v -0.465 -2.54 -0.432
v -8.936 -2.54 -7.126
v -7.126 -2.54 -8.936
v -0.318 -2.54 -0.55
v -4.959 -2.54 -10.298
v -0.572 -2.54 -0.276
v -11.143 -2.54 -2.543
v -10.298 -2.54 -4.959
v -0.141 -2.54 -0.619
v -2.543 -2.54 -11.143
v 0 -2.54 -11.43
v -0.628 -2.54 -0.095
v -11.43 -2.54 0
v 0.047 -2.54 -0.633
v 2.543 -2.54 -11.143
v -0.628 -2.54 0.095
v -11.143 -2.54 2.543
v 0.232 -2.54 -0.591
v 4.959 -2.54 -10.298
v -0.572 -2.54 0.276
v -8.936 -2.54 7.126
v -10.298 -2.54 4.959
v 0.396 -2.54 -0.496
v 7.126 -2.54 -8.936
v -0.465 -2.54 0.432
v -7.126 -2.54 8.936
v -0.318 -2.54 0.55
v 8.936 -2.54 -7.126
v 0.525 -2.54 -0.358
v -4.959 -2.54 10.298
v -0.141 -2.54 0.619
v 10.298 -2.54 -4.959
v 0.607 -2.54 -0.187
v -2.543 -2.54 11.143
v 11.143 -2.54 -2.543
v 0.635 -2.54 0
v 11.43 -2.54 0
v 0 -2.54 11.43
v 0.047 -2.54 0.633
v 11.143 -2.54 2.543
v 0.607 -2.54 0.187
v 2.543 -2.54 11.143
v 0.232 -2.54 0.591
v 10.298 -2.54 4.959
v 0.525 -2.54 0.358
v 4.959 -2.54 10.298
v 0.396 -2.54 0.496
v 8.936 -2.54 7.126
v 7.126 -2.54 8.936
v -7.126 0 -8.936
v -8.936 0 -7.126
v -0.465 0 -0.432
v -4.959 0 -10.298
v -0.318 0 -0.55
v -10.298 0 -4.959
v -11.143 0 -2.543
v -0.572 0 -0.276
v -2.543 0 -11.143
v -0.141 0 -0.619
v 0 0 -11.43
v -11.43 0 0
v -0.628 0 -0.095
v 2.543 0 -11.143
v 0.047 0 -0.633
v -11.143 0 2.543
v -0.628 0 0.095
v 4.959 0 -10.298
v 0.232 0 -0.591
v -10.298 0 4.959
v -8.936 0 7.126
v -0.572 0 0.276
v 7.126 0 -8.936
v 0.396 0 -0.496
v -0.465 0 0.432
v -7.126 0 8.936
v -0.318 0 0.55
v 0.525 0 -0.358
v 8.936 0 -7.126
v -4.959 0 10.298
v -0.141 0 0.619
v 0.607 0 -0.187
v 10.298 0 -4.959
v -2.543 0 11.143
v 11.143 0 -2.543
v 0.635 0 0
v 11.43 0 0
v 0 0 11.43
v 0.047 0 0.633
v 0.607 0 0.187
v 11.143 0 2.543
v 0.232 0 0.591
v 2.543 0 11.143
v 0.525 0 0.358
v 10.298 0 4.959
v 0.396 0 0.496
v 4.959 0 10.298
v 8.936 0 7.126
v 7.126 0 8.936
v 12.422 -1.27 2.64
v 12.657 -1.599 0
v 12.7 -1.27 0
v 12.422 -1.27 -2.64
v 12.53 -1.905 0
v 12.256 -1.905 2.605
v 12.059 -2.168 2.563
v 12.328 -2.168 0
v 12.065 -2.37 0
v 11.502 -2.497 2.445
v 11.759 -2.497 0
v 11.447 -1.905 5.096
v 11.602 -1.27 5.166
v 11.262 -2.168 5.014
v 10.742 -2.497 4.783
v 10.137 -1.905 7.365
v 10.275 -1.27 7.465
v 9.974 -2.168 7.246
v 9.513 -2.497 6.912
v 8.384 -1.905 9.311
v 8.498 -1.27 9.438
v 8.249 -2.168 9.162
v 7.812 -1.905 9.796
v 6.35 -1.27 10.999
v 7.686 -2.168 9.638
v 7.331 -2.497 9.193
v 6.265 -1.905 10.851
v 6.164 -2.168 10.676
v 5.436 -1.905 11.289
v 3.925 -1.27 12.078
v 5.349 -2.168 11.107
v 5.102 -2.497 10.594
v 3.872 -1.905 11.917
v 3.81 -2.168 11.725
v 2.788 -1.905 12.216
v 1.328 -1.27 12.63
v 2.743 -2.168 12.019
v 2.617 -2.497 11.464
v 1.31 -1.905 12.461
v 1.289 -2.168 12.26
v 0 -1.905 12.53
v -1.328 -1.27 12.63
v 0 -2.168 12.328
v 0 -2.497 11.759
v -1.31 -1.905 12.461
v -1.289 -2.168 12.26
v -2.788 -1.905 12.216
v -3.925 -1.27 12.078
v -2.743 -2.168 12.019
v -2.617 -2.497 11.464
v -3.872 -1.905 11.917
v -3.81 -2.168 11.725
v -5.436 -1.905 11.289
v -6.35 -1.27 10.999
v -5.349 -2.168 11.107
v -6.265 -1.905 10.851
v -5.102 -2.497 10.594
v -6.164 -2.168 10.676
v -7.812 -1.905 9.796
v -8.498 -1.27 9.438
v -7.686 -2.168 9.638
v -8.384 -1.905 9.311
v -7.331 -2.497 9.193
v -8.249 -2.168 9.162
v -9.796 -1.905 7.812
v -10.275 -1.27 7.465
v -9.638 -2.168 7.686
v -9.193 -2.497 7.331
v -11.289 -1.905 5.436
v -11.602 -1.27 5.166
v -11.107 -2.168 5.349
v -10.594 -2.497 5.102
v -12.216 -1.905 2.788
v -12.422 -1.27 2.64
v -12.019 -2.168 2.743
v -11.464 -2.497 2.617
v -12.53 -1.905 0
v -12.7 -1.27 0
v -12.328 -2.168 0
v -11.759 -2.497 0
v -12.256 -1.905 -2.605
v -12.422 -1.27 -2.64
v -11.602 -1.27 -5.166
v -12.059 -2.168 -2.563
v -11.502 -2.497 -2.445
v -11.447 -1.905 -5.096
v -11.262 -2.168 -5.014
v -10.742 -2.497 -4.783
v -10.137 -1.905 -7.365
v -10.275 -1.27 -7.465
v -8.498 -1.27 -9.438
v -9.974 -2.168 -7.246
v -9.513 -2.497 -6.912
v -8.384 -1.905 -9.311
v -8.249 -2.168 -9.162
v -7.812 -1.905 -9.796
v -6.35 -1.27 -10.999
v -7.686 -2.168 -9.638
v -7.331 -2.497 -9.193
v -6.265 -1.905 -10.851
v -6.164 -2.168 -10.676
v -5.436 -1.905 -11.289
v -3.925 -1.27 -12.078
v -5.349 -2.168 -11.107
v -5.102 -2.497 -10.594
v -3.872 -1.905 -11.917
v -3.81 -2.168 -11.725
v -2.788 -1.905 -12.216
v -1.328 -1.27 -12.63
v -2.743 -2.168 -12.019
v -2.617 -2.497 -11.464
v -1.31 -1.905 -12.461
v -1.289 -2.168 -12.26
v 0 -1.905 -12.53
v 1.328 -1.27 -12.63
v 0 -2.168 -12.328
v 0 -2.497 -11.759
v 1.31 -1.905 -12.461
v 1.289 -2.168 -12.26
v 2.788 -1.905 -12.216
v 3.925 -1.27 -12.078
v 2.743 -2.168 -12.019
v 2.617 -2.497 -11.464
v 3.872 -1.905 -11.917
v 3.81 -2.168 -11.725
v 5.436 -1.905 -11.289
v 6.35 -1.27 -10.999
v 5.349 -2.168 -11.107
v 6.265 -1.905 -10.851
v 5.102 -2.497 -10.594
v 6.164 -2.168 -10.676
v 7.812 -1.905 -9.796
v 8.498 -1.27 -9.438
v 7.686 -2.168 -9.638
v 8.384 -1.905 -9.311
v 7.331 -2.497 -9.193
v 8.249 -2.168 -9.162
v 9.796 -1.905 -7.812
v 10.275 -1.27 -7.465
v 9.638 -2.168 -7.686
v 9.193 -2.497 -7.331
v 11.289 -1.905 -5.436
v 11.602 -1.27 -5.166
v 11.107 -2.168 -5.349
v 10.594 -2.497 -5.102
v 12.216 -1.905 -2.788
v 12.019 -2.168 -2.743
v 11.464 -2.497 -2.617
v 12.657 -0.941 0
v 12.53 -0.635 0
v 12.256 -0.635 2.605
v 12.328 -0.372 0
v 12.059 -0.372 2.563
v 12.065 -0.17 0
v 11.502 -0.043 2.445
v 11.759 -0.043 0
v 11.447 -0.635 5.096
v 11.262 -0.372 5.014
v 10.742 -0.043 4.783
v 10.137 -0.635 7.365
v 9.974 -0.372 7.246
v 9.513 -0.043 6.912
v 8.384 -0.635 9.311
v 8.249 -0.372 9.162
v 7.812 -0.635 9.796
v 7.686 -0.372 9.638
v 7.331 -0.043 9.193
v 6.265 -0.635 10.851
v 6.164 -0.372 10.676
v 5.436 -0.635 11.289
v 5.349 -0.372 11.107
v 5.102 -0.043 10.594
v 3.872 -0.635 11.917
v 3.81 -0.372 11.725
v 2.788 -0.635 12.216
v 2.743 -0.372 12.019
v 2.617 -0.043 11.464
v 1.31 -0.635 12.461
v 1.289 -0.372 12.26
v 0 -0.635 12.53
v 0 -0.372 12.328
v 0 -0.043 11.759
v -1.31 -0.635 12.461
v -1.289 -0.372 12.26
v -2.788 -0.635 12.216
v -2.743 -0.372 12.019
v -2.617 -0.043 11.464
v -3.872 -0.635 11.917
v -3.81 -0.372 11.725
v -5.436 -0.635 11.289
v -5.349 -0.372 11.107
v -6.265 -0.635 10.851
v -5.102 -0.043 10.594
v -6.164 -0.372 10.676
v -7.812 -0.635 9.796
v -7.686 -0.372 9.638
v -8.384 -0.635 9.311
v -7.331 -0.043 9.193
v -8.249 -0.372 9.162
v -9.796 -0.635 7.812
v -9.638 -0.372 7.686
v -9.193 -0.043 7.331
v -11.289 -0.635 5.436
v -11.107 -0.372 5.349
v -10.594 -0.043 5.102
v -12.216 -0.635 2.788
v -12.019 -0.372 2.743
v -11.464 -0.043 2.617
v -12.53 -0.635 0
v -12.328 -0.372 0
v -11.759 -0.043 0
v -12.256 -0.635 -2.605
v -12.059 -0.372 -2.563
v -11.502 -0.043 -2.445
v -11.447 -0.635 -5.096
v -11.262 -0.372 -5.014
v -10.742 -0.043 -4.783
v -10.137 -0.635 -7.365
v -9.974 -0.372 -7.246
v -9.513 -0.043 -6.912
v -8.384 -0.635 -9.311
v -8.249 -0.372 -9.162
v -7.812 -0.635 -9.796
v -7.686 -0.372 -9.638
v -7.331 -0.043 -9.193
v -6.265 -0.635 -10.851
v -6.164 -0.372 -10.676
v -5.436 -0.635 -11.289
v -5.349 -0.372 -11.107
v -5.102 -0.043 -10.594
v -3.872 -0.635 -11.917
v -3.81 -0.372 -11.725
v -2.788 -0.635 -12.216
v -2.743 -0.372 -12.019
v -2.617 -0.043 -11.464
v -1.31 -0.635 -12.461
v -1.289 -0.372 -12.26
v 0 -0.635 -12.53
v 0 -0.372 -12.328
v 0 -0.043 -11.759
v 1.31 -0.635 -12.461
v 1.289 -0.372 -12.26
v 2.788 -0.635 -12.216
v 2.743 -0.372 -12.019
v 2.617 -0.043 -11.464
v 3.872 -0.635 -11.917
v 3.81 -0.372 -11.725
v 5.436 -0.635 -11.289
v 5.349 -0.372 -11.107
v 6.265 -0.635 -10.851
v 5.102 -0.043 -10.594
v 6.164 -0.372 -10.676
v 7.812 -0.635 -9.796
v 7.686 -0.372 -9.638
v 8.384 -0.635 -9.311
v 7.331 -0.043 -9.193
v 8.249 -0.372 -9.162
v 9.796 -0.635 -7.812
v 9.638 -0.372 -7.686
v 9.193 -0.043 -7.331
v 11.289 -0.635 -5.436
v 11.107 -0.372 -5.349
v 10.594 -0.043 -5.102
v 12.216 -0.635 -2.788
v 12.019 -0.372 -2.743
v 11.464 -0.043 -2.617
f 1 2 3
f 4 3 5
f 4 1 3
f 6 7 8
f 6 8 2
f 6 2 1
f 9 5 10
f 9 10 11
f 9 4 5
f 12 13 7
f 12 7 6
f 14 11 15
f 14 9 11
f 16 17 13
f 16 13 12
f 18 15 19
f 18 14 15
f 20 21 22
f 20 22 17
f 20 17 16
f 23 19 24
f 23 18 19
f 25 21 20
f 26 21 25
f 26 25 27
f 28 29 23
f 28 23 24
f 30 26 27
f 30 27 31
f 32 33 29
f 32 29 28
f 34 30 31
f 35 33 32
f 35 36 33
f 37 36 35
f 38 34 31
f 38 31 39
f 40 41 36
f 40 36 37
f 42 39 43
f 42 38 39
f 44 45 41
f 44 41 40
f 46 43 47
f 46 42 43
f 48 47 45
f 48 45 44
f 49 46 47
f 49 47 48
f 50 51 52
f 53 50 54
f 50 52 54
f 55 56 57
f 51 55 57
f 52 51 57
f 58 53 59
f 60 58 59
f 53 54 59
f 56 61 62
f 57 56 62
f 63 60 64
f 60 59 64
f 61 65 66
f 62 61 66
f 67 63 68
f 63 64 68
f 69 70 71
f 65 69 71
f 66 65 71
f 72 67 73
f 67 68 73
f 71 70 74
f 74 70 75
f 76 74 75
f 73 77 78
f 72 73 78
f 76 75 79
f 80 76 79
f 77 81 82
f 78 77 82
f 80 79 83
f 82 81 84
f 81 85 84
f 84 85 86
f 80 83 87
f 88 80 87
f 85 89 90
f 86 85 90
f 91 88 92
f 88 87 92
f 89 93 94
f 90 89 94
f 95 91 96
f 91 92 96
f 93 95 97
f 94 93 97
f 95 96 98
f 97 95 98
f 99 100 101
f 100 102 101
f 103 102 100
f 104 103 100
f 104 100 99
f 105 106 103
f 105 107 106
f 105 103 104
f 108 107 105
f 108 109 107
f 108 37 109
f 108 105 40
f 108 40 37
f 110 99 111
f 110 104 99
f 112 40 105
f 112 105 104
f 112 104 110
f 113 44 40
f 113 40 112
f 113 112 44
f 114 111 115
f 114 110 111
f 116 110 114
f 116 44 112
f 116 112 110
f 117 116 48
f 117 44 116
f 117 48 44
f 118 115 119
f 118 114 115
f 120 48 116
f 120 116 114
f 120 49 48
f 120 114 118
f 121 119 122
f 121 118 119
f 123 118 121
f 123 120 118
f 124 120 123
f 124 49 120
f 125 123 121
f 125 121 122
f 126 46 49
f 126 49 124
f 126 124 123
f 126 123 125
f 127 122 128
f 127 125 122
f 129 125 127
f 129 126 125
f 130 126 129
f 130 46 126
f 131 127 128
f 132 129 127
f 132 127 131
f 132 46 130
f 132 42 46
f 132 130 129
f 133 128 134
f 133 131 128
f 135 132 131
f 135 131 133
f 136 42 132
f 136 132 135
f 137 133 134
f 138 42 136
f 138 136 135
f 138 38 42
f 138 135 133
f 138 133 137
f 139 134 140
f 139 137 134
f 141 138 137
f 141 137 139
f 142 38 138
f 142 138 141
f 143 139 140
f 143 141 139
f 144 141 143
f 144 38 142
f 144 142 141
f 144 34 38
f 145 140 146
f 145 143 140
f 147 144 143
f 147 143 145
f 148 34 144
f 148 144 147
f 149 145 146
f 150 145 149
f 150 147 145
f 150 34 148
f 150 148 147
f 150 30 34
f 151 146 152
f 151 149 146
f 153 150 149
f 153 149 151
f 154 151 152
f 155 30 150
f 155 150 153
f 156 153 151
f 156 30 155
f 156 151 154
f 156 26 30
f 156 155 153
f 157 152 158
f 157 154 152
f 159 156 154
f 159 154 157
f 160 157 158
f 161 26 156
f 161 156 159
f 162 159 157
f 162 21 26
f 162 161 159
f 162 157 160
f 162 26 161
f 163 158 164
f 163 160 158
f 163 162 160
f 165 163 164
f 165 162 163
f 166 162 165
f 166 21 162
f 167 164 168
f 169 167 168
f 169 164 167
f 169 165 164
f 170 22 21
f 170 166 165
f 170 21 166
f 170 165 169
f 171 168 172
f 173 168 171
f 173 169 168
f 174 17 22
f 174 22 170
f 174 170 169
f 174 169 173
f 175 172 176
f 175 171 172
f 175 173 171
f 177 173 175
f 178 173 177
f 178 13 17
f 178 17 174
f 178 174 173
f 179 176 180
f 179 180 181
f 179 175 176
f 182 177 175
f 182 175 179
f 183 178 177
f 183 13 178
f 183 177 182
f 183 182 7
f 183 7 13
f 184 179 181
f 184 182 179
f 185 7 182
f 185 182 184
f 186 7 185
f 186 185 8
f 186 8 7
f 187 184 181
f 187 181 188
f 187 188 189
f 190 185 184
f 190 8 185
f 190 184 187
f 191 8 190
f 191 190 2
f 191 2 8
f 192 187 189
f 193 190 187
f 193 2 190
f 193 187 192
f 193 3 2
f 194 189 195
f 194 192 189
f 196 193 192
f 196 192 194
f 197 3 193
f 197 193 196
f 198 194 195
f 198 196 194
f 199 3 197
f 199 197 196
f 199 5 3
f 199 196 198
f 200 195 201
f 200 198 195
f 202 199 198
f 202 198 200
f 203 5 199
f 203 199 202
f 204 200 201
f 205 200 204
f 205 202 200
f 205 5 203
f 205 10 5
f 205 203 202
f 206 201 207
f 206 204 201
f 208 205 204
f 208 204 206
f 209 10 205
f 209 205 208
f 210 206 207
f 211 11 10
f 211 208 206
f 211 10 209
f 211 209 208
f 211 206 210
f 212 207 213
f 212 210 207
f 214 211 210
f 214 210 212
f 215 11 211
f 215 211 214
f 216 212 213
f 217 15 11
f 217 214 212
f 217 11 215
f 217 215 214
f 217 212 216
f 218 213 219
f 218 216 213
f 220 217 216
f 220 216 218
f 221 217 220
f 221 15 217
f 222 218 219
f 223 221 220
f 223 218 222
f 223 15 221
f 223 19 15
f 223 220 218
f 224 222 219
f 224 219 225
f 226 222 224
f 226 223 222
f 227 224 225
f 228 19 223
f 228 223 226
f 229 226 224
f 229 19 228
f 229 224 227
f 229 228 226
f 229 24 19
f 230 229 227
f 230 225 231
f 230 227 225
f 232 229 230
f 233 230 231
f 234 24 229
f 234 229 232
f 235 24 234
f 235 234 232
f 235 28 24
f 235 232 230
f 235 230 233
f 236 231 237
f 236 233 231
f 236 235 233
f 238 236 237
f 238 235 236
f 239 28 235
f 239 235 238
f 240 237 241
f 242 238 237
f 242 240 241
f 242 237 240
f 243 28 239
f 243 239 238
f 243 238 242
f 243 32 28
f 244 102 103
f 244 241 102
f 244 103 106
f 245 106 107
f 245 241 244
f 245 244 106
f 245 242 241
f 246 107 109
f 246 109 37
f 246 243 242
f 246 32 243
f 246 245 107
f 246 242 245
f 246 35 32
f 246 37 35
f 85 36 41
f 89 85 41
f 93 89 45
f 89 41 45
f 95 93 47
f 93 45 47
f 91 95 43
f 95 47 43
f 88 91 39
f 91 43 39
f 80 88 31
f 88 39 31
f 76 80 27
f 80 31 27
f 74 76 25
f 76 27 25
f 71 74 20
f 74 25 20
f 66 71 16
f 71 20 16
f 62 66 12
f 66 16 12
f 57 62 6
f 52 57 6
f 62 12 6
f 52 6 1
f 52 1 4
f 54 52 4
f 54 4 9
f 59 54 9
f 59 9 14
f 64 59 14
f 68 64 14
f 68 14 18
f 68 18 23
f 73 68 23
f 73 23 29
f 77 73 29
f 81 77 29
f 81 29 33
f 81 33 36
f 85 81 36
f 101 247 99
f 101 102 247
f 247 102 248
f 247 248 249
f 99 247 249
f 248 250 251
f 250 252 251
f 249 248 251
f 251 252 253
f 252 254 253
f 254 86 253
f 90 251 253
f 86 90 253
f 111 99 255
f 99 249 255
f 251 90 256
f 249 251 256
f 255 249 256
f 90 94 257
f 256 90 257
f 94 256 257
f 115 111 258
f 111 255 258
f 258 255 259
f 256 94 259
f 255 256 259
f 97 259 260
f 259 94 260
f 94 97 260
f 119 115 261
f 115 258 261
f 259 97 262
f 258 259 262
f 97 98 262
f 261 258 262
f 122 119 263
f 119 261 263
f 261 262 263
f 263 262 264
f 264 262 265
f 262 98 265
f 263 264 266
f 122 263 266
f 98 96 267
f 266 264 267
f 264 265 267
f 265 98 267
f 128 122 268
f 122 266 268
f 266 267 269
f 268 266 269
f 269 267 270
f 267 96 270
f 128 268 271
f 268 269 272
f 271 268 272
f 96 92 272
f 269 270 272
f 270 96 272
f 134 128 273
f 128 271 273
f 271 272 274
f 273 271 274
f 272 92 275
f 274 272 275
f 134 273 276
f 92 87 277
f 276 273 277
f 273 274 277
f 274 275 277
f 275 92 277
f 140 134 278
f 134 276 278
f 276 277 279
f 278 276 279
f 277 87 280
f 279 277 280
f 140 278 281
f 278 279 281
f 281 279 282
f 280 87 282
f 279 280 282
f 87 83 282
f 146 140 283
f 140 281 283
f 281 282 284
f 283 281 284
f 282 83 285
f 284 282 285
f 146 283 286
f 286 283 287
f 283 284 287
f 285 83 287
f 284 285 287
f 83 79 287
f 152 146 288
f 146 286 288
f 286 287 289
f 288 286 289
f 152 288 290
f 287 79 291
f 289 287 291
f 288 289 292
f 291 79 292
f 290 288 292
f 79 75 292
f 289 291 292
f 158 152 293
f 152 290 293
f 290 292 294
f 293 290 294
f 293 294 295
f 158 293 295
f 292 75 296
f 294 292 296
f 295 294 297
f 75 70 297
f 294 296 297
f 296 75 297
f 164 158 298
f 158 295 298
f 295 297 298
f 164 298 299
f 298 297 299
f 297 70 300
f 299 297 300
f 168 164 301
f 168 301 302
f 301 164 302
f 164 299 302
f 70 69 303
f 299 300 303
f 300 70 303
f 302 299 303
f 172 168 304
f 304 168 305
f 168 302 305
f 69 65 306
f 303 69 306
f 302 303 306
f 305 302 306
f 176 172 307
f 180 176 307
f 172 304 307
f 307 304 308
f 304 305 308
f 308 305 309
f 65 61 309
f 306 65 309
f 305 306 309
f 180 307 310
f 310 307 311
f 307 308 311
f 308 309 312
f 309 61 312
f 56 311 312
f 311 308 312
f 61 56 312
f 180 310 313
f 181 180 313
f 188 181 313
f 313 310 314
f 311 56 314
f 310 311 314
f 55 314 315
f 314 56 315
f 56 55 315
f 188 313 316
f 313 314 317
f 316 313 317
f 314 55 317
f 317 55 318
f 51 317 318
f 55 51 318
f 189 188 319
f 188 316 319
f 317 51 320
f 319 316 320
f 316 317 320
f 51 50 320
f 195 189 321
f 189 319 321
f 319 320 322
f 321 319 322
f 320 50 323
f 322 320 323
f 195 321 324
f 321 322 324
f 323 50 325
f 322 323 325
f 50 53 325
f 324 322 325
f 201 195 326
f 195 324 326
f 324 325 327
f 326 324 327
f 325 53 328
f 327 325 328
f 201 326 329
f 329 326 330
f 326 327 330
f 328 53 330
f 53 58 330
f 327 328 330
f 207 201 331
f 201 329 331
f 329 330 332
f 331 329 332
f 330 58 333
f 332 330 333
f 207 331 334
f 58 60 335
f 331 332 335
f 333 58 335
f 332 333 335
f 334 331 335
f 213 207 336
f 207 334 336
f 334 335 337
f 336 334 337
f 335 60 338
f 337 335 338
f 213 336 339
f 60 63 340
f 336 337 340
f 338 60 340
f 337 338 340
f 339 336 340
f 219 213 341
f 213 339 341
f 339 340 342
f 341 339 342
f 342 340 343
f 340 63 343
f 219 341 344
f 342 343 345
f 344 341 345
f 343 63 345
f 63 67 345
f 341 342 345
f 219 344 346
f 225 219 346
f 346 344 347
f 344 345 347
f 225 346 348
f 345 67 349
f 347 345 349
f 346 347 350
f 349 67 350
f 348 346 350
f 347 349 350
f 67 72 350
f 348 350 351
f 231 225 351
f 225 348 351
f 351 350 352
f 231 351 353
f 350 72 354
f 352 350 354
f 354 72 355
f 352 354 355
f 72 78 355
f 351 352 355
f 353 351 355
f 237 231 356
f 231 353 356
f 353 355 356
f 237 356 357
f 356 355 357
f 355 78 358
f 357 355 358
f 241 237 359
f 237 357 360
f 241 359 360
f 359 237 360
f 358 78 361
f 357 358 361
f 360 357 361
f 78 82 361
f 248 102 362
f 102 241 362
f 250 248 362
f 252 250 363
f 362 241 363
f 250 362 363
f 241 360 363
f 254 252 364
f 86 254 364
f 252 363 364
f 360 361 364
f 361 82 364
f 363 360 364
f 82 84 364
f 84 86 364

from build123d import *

# Parameters (mm, degrees)
F0_R     = 12.7
F1_DEPTH = 2.54
F2_R     = 0.635
F3_DEPTH = 25.4
F4_R     = 1.26999


# Not quite as in the source:
# - a fillet or chamfer is up to 0.001 mm smaller than in the source, because OpenCascade refuses the exact size


with BuildPart() as f1:
    # F0 (on Front) → F1 (new body)
    with BuildSketch(Plane.XZ):
        Circle(F0_R)
    extrude(amount=F1_DEPTH)

    # F2 (on face) → F3 (cut)
    with BuildSketch(Plane.XZ.offset(2.54)):
        Circle(F2_R)
    extrude(amount=-F3_DEPTH, mode=Mode.SUBTRACT)

    # F4 (radius 1.27 in the source; OpenCascade refuses exactly that, so slightly less here)
    f4_edges = [f1.edges().sort_by_distance(p)[0] for p in [
        (-12.7, -2.54, 0),
        (-12.7, 0, 0),
    ]]
    fillet(f4_edges, radius=F4_R)


solid = f1.part
